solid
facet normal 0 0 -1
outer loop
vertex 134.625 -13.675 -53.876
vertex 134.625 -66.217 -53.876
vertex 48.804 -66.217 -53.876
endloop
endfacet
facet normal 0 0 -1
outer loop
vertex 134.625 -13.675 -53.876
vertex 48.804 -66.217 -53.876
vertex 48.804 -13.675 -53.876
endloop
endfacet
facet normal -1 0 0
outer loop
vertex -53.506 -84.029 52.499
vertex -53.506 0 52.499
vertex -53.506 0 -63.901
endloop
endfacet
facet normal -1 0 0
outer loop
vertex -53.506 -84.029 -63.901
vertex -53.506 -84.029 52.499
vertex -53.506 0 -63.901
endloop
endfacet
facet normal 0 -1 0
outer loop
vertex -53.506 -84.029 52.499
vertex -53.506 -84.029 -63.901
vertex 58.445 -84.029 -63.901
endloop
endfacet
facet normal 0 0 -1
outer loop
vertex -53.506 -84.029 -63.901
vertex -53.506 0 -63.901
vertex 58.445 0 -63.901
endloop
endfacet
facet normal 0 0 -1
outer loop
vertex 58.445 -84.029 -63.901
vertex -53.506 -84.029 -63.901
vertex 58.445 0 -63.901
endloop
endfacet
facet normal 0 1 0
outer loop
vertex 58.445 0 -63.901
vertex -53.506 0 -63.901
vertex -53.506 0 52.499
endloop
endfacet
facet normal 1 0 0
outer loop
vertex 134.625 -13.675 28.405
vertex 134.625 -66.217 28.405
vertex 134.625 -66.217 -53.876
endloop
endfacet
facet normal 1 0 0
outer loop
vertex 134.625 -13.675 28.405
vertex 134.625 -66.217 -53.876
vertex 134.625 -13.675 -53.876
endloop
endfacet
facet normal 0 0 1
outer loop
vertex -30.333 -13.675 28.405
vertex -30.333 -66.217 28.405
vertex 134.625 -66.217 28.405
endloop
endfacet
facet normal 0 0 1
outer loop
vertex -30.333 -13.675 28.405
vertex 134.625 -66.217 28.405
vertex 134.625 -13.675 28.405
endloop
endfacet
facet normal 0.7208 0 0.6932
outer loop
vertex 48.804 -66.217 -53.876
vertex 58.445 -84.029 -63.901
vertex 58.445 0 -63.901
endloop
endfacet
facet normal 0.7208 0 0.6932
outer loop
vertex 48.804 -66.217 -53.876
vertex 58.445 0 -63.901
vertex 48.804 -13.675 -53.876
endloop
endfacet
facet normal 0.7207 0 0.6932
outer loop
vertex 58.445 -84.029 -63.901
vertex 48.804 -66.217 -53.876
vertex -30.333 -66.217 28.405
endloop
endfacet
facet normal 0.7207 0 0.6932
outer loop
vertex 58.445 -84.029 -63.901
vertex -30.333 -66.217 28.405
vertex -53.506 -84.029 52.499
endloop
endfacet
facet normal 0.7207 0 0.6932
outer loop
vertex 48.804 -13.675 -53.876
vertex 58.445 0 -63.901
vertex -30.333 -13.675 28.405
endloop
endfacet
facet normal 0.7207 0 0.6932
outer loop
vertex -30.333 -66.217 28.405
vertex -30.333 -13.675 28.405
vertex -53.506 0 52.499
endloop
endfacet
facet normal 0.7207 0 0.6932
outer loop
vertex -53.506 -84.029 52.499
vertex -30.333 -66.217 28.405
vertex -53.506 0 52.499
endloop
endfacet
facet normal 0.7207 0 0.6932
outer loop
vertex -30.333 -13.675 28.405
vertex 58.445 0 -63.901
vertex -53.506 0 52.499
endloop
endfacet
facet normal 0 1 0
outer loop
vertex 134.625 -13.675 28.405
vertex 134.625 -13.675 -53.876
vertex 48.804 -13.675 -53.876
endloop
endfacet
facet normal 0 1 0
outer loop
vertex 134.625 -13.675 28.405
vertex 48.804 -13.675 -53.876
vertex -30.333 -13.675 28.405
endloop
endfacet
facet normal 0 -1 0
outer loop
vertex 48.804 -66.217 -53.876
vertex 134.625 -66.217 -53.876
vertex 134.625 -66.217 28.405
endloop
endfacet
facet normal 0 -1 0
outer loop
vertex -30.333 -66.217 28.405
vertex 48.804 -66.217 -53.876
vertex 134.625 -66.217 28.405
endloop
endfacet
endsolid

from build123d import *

# Parameters (mm, degrees)
F1_DEPTH = 84.0288382024
F4_W     = 52.5419712067
F4_H     = 82.2811126709


with BuildPart() as f1:
    # F0 (on Front) → F1 (new body)
    with BuildSketch(Plane.XZ):
        Polygon((58.445379138, -63.900783658), (-53.5063222051, 52.4989590049), (-53.5063222051, -63.900783658), align=None)
    extrude(amount=F1_DEPTH)

    # F4 (on offset) → F5 (join, up to the next surface of F1)
    with BuildSketch(Plane.YZ.offset(134.6250604838)):
        with Locations((-39.9457663298, -12.7352923155)):
            Rectangle(F4_W, F4_H)
    extrude(until=Until.NEXT, dir=(-1, 0, 0))


solid = f1.part
